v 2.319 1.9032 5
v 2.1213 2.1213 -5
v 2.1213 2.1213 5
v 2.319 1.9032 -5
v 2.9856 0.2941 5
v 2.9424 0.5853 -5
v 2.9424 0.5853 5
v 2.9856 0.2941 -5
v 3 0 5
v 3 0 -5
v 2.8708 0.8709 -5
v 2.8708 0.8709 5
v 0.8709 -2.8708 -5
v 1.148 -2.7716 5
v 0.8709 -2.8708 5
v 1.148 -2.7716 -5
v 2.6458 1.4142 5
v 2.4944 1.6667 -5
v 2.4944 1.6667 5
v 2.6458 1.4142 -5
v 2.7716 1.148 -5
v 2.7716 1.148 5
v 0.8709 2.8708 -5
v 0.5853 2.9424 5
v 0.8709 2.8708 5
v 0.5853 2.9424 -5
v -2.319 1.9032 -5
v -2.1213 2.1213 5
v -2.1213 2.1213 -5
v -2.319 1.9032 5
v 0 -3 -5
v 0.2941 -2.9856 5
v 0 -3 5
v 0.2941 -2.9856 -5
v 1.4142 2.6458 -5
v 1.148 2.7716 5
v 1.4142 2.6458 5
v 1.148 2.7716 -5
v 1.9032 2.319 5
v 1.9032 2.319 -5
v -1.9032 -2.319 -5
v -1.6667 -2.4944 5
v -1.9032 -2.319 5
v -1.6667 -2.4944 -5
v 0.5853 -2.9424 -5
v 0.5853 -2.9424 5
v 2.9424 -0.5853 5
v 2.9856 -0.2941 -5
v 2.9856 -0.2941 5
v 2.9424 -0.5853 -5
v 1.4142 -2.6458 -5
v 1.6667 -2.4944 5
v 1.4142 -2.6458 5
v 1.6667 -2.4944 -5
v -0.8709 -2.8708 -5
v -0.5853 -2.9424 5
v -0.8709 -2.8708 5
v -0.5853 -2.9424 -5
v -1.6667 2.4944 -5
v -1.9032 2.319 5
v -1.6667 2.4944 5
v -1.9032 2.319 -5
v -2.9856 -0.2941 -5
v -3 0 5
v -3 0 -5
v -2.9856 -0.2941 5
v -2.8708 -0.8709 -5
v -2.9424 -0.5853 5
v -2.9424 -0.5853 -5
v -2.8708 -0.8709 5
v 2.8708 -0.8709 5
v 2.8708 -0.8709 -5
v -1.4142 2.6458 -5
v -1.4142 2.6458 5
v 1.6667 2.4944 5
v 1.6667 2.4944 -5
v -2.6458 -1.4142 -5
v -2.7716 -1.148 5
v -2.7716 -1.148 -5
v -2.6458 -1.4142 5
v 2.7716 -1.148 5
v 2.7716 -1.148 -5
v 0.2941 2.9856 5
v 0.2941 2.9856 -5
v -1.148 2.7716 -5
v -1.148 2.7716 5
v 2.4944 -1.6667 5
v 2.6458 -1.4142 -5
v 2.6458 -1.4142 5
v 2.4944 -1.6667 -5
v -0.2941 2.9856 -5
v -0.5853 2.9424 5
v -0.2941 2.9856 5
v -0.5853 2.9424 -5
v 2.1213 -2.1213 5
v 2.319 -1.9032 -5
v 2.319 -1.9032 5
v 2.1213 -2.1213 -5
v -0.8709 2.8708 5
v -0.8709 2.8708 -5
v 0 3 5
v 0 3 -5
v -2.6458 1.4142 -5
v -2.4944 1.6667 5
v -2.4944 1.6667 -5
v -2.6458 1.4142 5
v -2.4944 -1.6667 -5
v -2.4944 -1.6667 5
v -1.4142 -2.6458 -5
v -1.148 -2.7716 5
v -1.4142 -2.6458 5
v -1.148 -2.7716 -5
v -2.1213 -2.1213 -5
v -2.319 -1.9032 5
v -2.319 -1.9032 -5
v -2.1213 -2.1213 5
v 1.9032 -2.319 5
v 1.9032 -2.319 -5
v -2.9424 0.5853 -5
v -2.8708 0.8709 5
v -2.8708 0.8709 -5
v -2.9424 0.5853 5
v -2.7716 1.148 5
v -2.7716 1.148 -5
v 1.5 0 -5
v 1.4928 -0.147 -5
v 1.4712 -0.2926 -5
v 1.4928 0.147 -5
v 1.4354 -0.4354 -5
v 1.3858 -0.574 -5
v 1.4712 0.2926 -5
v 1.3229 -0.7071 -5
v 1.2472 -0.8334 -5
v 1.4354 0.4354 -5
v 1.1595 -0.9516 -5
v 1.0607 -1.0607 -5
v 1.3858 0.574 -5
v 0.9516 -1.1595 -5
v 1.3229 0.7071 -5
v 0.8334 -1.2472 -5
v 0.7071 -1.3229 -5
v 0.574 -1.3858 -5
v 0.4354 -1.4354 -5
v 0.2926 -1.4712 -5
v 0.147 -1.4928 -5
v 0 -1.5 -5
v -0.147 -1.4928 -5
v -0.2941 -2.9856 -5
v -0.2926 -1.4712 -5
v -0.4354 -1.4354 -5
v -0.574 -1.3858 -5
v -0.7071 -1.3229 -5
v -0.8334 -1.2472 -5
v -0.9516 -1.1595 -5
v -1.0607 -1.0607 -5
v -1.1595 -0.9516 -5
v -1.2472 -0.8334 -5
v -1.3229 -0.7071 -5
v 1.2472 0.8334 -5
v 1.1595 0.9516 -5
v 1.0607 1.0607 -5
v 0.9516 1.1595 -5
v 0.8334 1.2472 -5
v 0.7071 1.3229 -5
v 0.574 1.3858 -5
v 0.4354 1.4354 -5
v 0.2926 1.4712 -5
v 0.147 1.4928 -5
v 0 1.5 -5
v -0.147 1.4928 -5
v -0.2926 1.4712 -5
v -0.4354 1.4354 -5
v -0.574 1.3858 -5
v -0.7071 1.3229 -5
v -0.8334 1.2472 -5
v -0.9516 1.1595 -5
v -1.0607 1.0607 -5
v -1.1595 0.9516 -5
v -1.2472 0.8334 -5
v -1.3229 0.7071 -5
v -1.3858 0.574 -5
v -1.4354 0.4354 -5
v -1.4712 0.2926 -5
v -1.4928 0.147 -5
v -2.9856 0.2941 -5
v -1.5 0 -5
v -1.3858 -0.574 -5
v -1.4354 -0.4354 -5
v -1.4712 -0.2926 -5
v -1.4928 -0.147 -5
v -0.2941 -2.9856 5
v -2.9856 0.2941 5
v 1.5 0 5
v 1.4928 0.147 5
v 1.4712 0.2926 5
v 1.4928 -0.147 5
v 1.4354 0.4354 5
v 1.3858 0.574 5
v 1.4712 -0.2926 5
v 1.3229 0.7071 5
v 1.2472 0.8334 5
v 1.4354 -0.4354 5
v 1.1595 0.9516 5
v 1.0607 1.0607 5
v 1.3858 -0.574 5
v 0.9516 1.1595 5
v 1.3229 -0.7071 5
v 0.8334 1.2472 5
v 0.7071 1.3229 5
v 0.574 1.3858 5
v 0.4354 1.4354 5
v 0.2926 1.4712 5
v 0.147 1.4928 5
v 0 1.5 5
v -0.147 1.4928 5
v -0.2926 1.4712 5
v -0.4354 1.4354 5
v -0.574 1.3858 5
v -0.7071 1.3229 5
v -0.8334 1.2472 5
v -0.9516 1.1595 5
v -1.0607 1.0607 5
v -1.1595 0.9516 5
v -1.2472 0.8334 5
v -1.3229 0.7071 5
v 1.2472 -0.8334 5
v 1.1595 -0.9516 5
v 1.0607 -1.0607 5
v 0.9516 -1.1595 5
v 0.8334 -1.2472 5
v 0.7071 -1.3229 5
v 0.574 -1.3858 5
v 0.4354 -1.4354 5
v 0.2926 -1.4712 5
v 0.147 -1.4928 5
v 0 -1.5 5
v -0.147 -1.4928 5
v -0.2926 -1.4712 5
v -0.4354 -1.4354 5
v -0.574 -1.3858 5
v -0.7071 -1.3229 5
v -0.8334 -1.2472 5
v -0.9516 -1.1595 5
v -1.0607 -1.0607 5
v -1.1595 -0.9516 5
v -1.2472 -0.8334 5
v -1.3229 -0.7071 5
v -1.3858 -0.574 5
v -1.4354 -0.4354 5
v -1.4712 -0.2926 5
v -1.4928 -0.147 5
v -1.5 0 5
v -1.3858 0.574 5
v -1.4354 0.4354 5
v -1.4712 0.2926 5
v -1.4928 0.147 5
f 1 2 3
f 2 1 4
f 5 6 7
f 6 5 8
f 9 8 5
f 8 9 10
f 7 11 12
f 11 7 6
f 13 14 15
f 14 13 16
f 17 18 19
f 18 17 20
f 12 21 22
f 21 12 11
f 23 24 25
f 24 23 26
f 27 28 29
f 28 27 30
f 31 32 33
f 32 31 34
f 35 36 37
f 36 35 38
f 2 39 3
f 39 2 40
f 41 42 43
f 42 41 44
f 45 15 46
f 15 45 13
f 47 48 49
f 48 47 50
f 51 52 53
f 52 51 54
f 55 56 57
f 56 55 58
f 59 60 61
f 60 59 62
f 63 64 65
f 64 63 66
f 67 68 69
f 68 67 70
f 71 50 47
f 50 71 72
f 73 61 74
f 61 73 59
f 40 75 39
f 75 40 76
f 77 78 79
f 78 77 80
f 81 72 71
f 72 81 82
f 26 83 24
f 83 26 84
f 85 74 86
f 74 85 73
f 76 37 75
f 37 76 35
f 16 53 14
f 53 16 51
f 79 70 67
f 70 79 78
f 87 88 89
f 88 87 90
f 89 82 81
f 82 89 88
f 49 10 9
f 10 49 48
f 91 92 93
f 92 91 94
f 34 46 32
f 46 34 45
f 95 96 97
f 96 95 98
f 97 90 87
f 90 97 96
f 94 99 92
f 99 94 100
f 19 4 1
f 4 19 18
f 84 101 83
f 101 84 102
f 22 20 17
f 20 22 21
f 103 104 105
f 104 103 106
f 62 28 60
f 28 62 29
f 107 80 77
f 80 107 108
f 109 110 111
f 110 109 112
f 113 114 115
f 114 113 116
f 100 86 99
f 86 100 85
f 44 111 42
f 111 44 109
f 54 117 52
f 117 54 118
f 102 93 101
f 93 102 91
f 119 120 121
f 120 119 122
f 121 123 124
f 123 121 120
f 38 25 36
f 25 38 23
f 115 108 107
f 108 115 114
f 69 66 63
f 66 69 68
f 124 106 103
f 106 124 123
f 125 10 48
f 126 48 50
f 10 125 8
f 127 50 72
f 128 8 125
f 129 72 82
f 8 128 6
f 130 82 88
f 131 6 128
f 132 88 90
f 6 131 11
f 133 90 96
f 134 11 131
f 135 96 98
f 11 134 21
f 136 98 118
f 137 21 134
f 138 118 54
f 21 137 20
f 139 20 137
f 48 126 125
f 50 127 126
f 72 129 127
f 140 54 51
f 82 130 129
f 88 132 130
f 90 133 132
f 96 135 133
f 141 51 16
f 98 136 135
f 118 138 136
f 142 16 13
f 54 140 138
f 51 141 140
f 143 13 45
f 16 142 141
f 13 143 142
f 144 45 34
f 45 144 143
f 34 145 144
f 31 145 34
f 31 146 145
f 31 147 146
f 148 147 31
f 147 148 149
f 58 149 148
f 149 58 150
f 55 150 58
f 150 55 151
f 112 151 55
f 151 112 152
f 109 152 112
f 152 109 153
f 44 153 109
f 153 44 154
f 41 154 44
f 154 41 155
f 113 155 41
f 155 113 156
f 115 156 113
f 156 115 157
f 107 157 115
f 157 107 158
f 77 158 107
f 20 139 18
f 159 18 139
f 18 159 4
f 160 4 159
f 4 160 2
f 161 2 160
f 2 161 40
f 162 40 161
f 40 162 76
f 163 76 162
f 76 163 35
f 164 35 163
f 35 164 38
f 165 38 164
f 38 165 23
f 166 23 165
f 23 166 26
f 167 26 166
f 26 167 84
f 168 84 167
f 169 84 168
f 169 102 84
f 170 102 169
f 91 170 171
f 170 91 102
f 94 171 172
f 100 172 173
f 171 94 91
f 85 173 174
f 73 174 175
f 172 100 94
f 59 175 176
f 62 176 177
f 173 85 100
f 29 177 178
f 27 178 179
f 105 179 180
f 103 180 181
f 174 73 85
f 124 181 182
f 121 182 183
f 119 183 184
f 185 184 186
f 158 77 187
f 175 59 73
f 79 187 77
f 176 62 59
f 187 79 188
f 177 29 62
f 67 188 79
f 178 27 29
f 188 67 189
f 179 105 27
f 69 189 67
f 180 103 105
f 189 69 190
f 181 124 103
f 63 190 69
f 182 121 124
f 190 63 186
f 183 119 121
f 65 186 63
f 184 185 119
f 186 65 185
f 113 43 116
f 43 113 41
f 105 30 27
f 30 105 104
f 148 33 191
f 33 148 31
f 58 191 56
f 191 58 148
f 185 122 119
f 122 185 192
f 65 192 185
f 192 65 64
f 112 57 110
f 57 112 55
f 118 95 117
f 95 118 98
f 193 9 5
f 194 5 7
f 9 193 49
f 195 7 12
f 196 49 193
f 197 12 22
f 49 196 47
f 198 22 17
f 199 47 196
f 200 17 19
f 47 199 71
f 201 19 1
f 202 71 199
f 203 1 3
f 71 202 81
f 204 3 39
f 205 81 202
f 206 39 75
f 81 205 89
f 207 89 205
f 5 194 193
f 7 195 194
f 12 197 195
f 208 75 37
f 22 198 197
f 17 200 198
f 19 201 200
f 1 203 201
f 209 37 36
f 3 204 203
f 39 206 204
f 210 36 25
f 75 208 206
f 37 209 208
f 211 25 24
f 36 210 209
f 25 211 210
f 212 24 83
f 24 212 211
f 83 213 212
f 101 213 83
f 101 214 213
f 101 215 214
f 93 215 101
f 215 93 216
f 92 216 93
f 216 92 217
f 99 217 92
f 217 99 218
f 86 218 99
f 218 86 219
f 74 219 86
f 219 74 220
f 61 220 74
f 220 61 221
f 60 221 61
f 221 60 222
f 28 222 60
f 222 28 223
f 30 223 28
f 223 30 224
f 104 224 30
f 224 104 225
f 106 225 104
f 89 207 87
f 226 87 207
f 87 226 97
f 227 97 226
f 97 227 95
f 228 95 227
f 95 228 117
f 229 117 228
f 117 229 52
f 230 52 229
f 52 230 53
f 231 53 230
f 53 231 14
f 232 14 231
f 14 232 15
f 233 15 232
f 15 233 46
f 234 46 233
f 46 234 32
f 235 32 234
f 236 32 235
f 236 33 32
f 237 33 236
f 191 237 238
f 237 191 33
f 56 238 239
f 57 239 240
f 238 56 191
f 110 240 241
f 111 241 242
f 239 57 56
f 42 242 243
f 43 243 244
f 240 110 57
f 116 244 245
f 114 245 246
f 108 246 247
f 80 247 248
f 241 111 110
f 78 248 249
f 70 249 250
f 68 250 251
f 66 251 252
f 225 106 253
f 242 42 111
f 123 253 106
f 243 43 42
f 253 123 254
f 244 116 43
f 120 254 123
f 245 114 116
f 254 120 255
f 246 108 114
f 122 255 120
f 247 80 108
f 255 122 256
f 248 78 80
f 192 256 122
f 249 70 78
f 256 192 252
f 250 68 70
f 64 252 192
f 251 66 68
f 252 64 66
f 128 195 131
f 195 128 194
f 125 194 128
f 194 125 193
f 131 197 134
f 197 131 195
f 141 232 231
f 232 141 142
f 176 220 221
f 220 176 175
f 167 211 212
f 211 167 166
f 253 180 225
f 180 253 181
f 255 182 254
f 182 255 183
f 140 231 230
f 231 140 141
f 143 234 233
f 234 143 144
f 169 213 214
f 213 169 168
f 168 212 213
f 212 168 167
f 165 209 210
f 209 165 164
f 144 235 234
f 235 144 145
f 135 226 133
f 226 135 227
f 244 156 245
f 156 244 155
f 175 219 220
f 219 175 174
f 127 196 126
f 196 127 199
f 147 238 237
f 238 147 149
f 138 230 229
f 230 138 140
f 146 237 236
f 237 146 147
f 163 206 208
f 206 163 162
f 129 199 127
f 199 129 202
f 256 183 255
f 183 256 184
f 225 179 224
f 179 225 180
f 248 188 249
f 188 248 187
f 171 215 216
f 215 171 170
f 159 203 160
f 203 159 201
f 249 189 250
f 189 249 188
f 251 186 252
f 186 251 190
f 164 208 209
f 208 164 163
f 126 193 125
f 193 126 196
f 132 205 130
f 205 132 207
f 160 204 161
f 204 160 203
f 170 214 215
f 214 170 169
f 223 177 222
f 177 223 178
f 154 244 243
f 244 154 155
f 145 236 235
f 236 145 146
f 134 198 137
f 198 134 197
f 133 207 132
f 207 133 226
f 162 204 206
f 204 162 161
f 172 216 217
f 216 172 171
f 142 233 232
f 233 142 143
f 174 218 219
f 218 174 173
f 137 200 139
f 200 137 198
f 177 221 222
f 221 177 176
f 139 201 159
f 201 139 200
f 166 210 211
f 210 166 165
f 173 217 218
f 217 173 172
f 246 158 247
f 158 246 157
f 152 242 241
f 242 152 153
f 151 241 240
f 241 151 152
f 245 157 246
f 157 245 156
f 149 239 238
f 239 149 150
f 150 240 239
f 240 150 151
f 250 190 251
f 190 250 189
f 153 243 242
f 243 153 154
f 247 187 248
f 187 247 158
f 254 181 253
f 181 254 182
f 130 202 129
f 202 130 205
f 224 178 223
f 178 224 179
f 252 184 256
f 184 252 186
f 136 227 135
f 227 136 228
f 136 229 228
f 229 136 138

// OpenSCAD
$fn=64;

thread_d = 3.0;
length = 10.0;
outer_d = 6.0;

module standoff_pillar(od, id, h){
    difference(){
        cylinder(d=od, h=h, center=true);
        cylinder(d=id, h=h+0.4, center=true);
    }
}

standoff_pillar(outer_d, thread_d, length);
